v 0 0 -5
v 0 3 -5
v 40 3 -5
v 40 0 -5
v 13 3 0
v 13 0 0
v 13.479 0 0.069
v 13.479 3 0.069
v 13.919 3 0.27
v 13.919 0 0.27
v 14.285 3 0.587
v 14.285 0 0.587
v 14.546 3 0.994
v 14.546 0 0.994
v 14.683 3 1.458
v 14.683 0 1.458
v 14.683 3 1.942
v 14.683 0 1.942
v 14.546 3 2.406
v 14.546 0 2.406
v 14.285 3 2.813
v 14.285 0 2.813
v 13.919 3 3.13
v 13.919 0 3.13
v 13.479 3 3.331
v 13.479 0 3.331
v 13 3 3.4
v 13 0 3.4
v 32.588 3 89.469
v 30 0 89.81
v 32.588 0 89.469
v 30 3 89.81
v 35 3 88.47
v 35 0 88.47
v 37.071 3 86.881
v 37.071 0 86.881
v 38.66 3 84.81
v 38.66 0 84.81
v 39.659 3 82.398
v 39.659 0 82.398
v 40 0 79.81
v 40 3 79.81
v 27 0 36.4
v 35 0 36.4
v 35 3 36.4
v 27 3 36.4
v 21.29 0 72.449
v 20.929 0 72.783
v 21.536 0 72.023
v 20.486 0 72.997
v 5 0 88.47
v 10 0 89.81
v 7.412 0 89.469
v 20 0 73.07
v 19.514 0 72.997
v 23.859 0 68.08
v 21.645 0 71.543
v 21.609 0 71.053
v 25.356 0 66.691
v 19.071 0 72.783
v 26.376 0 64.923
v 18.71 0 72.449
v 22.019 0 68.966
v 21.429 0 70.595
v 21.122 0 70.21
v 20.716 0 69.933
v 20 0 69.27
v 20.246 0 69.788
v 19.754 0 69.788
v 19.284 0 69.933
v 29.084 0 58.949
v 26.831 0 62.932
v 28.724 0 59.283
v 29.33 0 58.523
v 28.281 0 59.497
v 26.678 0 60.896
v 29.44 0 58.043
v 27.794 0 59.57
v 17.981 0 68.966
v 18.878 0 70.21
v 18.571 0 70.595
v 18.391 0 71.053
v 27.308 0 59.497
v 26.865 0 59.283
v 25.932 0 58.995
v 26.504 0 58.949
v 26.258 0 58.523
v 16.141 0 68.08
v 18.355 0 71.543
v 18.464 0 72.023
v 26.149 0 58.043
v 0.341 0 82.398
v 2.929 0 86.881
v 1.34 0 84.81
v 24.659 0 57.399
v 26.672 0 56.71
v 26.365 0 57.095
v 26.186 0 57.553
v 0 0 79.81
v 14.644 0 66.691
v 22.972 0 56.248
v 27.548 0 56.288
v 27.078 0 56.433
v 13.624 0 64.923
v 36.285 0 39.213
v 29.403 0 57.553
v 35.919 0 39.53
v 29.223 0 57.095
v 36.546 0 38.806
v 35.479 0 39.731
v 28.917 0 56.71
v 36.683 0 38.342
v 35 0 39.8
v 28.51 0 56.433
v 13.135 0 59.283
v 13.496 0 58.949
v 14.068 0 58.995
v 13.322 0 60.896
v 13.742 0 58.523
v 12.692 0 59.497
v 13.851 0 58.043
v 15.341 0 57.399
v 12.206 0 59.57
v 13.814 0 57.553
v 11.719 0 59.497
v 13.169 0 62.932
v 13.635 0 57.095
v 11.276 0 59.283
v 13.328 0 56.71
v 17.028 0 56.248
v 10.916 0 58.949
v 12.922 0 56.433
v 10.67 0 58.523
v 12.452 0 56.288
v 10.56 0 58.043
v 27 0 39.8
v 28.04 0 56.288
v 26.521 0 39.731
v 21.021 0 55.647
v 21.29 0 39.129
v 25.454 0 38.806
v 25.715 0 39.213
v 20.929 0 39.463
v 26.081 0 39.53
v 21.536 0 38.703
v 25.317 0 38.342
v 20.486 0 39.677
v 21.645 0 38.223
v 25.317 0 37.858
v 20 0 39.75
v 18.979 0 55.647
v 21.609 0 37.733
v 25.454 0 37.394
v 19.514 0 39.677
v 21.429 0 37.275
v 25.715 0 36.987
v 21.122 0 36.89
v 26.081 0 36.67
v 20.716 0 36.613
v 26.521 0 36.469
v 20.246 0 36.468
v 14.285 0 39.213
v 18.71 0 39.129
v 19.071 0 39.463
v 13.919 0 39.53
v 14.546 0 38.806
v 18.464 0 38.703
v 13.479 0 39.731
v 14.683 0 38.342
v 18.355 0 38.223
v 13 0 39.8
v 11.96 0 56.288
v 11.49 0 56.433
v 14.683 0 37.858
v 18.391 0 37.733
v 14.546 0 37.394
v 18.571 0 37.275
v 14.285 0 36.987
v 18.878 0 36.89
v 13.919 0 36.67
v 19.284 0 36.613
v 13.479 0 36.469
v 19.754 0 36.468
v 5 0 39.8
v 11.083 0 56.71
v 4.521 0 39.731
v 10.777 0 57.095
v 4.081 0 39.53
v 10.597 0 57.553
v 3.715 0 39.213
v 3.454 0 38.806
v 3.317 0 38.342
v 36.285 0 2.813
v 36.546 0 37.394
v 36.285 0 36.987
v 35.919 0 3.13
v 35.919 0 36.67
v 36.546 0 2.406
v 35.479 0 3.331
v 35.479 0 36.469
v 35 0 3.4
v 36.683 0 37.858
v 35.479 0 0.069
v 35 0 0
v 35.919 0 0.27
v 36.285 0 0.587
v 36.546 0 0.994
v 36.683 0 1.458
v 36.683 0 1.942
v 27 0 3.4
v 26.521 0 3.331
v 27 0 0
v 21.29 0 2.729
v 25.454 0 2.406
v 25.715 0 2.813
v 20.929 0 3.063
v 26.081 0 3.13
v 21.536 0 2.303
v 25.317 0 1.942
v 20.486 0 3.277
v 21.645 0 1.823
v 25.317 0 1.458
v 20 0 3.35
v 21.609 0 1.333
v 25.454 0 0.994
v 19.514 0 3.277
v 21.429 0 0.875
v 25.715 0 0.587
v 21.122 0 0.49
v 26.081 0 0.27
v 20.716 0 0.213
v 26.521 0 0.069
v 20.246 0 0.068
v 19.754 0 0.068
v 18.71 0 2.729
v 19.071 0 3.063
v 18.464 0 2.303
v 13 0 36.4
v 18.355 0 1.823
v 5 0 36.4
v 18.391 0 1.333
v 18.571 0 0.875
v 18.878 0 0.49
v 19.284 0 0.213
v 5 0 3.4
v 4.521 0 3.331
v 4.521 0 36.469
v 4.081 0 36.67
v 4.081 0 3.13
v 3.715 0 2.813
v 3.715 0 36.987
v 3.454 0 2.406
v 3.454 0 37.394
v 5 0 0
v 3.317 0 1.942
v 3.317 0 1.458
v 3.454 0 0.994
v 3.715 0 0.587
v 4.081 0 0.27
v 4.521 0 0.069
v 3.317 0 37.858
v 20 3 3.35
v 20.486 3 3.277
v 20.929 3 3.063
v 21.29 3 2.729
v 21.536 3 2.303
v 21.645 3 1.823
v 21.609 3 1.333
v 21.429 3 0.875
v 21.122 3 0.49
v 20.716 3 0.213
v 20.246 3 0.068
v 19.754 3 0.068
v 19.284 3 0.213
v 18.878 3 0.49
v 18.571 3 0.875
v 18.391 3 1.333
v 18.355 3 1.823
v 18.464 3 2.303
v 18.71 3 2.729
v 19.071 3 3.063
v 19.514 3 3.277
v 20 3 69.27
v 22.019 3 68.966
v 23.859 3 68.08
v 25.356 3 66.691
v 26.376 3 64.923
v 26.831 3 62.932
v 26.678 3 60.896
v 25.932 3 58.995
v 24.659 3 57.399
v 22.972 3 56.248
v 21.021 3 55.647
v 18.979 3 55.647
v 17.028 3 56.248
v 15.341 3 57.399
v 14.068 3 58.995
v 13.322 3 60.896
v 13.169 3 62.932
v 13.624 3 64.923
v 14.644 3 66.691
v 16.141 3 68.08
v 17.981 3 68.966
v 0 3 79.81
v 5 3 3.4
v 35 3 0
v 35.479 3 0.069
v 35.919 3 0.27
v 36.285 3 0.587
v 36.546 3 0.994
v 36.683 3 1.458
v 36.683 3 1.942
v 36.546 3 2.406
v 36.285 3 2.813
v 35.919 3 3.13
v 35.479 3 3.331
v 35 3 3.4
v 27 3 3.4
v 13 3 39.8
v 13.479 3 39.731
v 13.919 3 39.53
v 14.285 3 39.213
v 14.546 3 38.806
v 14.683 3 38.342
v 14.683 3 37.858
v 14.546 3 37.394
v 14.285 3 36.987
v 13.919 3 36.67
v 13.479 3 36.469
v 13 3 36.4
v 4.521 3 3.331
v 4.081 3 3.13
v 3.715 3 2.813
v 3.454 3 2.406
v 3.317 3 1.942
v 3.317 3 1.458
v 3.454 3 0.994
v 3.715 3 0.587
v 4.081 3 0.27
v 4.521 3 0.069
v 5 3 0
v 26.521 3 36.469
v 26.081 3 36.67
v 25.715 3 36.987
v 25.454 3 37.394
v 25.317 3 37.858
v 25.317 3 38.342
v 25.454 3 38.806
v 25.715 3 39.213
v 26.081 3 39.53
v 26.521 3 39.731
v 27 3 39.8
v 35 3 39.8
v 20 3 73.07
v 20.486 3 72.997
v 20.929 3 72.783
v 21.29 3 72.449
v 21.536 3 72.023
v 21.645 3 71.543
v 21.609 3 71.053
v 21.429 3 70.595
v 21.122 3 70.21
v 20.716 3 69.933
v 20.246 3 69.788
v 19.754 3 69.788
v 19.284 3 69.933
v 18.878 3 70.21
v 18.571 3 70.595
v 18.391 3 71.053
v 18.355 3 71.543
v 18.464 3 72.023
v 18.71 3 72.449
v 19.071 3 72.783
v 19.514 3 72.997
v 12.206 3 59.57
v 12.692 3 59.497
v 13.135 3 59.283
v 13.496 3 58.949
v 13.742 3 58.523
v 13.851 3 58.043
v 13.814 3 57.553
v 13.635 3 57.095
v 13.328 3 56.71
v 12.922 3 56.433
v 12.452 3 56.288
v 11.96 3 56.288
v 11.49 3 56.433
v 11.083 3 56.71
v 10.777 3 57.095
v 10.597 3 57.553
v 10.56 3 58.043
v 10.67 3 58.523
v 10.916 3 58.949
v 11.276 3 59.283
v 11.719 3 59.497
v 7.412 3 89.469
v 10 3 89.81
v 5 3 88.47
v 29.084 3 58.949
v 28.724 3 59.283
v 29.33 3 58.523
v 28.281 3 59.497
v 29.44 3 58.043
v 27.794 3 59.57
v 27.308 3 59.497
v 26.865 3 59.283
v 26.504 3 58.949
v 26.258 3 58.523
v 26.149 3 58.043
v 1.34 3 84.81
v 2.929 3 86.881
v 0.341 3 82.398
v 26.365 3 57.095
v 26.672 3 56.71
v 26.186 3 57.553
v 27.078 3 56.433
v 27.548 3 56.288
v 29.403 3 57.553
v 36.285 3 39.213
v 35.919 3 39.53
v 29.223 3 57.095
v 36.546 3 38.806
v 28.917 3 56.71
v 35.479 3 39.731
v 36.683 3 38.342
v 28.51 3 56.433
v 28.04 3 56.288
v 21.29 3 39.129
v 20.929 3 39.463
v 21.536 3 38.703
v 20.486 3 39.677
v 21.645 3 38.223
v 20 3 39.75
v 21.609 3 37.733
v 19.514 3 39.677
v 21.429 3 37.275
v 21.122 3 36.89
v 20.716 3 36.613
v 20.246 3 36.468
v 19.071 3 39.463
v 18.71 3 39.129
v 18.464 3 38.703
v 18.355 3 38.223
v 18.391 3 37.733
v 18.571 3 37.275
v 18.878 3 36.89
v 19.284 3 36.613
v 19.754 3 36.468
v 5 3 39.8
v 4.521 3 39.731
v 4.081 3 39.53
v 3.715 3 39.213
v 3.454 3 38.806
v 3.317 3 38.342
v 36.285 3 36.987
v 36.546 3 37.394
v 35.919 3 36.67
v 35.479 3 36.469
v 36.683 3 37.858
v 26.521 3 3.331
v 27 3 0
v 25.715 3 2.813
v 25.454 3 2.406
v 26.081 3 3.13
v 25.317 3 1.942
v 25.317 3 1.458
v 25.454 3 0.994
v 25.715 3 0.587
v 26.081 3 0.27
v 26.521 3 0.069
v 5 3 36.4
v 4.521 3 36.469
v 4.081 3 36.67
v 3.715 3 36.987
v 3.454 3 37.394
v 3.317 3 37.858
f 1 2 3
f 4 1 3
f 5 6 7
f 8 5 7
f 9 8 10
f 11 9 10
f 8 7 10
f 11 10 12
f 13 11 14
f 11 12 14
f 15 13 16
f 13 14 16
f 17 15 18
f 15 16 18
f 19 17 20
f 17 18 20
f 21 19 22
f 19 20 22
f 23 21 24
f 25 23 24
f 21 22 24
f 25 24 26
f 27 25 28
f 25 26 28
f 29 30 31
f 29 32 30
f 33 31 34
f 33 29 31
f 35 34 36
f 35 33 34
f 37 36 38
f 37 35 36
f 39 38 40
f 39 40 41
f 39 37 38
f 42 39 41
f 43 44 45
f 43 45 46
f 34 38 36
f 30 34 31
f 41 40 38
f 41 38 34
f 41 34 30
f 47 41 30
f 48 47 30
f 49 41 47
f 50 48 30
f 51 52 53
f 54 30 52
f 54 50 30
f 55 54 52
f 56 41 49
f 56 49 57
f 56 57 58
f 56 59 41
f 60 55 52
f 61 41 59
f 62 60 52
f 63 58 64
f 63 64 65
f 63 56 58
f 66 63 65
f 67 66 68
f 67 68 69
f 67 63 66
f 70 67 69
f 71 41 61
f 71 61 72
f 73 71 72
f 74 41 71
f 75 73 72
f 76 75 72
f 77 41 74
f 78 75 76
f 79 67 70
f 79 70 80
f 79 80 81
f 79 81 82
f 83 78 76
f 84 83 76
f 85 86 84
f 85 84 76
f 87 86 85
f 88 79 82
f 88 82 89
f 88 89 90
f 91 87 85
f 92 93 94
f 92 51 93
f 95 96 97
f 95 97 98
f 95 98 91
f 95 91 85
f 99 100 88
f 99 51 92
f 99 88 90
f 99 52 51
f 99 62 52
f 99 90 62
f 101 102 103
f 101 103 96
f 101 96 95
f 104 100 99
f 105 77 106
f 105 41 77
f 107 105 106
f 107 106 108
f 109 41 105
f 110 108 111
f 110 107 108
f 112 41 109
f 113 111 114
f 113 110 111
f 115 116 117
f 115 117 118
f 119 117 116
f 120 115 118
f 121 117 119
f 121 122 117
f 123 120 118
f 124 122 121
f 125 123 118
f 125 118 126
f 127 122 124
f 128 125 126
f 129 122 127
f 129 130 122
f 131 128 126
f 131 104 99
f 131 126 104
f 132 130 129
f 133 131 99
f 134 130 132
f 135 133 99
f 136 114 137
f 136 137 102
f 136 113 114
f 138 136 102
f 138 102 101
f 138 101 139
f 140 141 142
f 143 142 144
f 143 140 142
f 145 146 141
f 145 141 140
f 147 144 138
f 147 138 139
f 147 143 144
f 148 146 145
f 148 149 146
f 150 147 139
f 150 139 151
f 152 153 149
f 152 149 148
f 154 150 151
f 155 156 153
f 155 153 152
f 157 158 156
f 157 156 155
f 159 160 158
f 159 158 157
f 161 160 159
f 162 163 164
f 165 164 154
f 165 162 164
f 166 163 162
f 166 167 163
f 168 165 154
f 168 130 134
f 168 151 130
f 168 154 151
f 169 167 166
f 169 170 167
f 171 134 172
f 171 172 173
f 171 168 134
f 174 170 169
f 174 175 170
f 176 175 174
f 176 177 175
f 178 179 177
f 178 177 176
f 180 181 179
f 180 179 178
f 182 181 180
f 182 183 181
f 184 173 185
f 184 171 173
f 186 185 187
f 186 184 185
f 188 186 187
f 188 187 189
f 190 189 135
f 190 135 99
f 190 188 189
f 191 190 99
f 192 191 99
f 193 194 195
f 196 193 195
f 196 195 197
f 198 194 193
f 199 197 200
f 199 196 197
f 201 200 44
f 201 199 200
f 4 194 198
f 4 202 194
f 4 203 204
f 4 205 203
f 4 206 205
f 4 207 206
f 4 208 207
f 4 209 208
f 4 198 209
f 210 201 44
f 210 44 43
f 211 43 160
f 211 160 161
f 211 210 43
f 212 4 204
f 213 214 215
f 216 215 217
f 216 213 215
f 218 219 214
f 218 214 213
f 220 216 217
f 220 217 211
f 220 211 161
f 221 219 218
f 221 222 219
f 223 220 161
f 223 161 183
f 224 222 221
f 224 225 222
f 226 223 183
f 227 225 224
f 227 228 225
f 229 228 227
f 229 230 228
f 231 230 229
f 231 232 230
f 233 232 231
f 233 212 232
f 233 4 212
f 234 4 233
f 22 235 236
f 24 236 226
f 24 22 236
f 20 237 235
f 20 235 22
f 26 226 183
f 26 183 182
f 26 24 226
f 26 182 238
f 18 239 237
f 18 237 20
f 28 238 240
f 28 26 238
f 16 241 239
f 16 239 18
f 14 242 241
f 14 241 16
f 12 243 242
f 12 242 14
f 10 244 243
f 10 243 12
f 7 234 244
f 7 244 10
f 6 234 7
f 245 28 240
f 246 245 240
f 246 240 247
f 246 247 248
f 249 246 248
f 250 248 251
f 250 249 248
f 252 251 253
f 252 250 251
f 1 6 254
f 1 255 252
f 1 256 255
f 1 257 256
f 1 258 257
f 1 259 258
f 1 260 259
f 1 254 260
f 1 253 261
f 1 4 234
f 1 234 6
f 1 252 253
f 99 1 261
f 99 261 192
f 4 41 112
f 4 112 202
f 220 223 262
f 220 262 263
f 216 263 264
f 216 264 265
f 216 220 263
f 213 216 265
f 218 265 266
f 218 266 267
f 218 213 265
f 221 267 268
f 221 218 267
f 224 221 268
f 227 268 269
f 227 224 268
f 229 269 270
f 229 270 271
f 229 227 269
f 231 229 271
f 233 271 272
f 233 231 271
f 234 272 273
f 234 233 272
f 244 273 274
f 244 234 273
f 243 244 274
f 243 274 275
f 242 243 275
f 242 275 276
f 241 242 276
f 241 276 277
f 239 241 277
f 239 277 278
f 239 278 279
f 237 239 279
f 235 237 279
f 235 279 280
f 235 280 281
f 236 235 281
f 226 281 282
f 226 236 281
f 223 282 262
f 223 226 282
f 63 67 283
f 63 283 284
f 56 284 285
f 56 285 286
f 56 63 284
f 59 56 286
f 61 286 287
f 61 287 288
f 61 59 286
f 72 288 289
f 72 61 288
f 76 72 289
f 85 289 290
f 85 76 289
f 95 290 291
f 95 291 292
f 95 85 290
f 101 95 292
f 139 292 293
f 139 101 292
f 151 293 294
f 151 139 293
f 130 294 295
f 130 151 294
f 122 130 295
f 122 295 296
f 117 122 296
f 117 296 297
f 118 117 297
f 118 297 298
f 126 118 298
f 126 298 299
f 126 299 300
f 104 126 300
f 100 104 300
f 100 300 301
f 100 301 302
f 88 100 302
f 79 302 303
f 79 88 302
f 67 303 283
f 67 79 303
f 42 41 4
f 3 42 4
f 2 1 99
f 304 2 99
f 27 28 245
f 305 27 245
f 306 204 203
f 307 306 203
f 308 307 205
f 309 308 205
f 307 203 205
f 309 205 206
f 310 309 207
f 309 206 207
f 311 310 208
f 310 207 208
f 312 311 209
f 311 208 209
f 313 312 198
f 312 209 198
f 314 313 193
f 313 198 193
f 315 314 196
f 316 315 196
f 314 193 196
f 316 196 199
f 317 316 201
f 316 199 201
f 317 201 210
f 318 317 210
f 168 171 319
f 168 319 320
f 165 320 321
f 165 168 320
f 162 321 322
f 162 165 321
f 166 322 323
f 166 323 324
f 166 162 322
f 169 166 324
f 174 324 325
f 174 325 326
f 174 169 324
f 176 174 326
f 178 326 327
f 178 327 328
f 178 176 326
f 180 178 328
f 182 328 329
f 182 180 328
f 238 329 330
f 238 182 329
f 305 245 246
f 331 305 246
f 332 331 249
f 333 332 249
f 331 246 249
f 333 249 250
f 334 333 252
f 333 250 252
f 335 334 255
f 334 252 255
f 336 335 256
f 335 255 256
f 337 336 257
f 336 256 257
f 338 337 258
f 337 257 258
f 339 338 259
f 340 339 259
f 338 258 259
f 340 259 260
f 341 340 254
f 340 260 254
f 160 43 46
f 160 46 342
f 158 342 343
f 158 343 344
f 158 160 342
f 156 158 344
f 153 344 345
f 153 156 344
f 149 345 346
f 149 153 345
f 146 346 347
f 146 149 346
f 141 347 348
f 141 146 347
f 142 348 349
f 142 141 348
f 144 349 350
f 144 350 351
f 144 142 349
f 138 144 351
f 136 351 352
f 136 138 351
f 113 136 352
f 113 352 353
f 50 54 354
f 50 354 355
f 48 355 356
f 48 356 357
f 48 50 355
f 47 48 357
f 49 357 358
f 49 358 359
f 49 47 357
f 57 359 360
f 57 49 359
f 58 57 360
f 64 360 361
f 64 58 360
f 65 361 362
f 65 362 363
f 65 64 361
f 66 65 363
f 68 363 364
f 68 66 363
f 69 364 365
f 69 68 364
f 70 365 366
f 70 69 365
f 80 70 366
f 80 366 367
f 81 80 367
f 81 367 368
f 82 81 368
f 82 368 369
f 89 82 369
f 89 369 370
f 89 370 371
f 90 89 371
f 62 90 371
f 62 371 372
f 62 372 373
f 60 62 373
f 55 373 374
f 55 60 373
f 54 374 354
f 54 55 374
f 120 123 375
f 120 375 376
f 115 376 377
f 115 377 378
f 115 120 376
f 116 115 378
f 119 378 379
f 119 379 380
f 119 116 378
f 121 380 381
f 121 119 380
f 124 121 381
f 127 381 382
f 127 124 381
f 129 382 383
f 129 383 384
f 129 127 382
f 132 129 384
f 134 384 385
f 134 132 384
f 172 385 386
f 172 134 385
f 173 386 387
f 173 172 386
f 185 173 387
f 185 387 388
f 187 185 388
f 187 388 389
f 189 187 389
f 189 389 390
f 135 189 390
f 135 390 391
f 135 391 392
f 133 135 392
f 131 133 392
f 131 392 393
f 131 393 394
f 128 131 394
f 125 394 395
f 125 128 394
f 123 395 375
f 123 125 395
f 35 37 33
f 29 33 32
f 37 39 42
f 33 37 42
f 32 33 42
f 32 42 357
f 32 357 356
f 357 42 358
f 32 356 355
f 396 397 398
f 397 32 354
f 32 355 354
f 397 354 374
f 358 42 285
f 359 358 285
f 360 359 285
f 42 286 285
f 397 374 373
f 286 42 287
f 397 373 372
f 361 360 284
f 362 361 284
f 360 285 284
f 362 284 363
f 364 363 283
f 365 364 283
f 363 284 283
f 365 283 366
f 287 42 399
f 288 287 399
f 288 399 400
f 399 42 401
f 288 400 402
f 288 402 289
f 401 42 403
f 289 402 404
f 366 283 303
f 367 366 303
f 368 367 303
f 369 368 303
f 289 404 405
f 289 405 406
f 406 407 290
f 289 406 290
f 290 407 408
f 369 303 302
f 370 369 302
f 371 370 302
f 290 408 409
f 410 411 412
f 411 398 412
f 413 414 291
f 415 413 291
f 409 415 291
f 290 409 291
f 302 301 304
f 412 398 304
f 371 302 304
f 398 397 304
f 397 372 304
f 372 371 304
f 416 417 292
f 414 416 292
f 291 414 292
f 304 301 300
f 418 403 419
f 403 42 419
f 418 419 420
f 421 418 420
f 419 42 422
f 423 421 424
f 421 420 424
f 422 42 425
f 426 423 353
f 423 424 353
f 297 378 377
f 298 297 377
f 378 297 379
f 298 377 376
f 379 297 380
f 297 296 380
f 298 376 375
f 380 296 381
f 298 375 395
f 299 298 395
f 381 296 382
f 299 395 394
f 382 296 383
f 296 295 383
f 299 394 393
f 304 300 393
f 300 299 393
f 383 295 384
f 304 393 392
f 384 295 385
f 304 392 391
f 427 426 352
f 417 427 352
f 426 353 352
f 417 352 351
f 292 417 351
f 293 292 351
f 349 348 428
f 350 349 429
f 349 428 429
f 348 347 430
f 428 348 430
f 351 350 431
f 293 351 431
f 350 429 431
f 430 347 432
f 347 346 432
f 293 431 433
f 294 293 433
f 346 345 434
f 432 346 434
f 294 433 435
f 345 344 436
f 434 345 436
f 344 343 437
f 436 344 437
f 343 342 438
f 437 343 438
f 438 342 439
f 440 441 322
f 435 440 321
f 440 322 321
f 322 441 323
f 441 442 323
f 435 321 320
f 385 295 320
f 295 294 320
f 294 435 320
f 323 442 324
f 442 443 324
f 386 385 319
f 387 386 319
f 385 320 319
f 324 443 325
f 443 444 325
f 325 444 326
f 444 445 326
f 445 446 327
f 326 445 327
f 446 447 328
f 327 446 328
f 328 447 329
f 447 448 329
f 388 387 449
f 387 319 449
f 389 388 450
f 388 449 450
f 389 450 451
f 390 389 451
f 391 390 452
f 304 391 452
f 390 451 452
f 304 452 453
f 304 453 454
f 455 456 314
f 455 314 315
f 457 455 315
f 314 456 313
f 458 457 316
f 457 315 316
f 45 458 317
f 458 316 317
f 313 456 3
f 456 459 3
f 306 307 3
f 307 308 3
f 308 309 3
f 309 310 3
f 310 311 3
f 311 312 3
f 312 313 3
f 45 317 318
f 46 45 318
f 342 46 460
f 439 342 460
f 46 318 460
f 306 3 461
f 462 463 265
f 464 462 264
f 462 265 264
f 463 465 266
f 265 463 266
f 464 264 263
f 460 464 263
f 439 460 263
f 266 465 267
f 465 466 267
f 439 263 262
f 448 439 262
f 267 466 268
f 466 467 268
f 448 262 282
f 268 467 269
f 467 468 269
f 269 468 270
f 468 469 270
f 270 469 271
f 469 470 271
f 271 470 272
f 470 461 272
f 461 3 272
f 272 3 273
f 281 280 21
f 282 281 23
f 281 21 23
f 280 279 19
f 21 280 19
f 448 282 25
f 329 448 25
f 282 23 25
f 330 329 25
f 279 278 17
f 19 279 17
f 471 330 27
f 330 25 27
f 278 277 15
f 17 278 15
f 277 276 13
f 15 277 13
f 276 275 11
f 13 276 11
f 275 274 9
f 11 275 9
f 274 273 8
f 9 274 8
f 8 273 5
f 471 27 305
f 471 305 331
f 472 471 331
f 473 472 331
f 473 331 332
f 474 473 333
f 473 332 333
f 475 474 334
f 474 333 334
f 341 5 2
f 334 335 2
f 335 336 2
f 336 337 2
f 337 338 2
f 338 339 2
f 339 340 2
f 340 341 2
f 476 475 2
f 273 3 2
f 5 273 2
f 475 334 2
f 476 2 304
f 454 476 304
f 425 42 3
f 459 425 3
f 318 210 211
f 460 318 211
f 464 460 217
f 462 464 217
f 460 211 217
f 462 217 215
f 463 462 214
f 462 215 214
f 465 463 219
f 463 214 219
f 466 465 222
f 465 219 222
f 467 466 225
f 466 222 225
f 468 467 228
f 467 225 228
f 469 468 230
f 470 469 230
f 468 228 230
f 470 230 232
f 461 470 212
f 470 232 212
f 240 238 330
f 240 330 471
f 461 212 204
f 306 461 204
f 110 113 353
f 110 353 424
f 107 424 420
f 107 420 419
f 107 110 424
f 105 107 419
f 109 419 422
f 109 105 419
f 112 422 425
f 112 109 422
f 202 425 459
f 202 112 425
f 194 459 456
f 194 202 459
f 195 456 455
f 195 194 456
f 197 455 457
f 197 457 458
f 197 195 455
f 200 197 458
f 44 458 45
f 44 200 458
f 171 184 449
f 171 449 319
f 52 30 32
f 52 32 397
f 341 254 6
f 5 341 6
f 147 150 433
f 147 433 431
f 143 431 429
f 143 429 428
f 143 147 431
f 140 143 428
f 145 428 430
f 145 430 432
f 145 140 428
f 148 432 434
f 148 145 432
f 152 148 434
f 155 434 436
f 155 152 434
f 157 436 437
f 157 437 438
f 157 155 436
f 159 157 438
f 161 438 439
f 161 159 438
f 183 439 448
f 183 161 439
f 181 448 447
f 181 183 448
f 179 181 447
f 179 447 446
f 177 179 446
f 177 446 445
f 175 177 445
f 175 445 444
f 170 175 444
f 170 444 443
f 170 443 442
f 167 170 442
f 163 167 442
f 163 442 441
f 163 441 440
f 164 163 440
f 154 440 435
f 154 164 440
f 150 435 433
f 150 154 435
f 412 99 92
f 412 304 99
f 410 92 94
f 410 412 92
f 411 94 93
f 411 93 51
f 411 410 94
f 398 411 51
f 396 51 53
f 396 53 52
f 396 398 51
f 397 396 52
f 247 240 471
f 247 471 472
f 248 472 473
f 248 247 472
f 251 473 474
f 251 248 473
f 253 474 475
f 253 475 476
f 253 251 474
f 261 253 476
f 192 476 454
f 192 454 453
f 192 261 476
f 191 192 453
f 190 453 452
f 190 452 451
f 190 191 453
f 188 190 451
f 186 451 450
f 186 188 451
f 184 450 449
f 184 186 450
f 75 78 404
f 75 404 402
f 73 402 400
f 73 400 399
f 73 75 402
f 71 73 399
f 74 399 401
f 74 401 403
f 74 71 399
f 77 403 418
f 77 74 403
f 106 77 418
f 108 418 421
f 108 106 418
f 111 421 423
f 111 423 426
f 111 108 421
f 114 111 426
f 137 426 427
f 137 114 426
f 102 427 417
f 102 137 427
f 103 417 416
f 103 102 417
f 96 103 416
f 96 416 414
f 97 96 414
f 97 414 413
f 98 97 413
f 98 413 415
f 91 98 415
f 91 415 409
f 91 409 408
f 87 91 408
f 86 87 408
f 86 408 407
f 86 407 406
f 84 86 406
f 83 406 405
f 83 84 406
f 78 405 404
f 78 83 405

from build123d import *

# Parameters (mm, degrees)
SKETCH_1_R          = 1.65
SKETCH_1_R_2        = 6.85
EXTRUDE_1_DEPTH     = 3
FILLET_1_R          = 10
SKETCH_2_W          = 40
SKETCH_2_H          = 72.562953015
CUT_EXTRUDE_1_DEPTH = 10


with BuildPart() as part:
    # 草图1 → 凸台-拉伸1 (new body)
    with BuildSketch(Plane(origin=(0, 0, 0), x_dir=(1, 0, 0), z_dir=(0, 1, 0))):
        Polygon((0, 0), (0, 50.01), (40, 50.01), (40, 0), (40, -89.81), (0, -89.81), align=None)
        with Locations(Location((20, -1.7, 0), (0, 0, 270))):
            Circle(SKETCH_1_R, mode=Mode.SUBTRACT)
        with Locations(Location((20, -38.1, 0), (0, 0, 270))):
            Circle(SKETCH_1_R, mode=Mode.SUBTRACT)
        with Locations(Location((20, 31.62, 0), (0, 0, 270))):
            Circle(SKETCH_1_R, mode=Mode.SUBTRACT)
        with Locations(Location((27.794228634, 18.12, 0), (0, 0, 270))):
            Circle(SKETCH_1_R, mode=Mode.SUBTRACT)
        with Locations(Location((12.205771366, 18.12, 0), (0, 0, 270))):
            Circle(SKETCH_1_R, mode=Mode.SUBTRACT)
        with Locations(Location((27.794228634, -57.92, 0), (0, 0, 270))):
            Circle(SKETCH_1_R, mode=Mode.SUBTRACT)
        with Locations(Location((12.205771366, -57.92, 0), (0, 0, 270))):
            Circle(SKETCH_1_R, mode=Mode.SUBTRACT)
        with Locations(Location((20, -71.42, 0), (0, 0, 270))):
            Circle(SKETCH_1_R, mode=Mode.SUBTRACT)
        with Locations(Location((20, 22.62, 0), (0, 0, 270))):
            Circle(SKETCH_1_R_2, mode=Mode.SUBTRACT)
        with Locations(Location((20, -62.42, 0), (0, 0, 270))):
            Circle(SKETCH_1_R_2, mode=Mode.SUBTRACT)
        with BuildLine():
            Line((5, 0), (13, 0))
            ThreePointArc((13, 0), (14.7, -1.7), (13, -3.4))
            Line((13, -3.4), (5, -3.4))
            ThreePointArc((5, -3.4), (3.3, -1.7), (5, 0))
        make_face(mode=Mode.SUBTRACT)
        with BuildLine():
            Line((27, 0), (35, 0))
            ThreePointArc((35, 0), (36.7, -1.7), (35, -3.4))
            Line((35, -3.4), (27, -3.4))
            ThreePointArc((27, -3.4), (25.3, -1.7), (27, 0))
        make_face(mode=Mode.SUBTRACT)
        with BuildLine():
            Line((27, -39.8), (35, -39.8))
            ThreePointArc((35, -39.8), (36.7, -38.1), (35, -36.4))
            Line((35, -36.4), (27, -36.4))
            ThreePointArc((27, -36.4), (25.3, -38.1), (27, -39.8))
        make_face(mode=Mode.SUBTRACT)
        with BuildLine():
            Line((5, -39.8), (13, -39.8))
            ThreePointArc((13, -39.8), (14.7, -38.1), (13, -36.4))
            Line((13, -36.4), (5, -36.4))
            ThreePointArc((5, -36.4), (3.3, -38.1), (5, -39.8))
        make_face(mode=Mode.SUBTRACT)
    extrude(amount=EXTRUDE_1_DEPTH)

    # 圆角1
    fillet_1_edges = [part.edges().sort_by_distance(p)[0] for p in [
        (0, 1.5, -50.01),
        (40, 1.5, -50.01),
        (40, 1.5, 89.81),
        (0, 1.5, 89.81),
    ]]
    fillet(fillet_1_edges, radius=FILLET_1_R)

    # 草图2 → 切除-拉伸1 (cut)
    with BuildSketch(Plane(origin=(0, 3, 0), x_dir=(1, 0, 0), z_dir=(0, 1, 0))):
        with Locations((20, 41.281476508)):
            Rectangle(SKETCH_2_W, SKETCH_2_H)
    extrude(amount=-CUT_EXTRUDE_1_DEPTH, mode=Mode.SUBTRACT)


solid = part.part
